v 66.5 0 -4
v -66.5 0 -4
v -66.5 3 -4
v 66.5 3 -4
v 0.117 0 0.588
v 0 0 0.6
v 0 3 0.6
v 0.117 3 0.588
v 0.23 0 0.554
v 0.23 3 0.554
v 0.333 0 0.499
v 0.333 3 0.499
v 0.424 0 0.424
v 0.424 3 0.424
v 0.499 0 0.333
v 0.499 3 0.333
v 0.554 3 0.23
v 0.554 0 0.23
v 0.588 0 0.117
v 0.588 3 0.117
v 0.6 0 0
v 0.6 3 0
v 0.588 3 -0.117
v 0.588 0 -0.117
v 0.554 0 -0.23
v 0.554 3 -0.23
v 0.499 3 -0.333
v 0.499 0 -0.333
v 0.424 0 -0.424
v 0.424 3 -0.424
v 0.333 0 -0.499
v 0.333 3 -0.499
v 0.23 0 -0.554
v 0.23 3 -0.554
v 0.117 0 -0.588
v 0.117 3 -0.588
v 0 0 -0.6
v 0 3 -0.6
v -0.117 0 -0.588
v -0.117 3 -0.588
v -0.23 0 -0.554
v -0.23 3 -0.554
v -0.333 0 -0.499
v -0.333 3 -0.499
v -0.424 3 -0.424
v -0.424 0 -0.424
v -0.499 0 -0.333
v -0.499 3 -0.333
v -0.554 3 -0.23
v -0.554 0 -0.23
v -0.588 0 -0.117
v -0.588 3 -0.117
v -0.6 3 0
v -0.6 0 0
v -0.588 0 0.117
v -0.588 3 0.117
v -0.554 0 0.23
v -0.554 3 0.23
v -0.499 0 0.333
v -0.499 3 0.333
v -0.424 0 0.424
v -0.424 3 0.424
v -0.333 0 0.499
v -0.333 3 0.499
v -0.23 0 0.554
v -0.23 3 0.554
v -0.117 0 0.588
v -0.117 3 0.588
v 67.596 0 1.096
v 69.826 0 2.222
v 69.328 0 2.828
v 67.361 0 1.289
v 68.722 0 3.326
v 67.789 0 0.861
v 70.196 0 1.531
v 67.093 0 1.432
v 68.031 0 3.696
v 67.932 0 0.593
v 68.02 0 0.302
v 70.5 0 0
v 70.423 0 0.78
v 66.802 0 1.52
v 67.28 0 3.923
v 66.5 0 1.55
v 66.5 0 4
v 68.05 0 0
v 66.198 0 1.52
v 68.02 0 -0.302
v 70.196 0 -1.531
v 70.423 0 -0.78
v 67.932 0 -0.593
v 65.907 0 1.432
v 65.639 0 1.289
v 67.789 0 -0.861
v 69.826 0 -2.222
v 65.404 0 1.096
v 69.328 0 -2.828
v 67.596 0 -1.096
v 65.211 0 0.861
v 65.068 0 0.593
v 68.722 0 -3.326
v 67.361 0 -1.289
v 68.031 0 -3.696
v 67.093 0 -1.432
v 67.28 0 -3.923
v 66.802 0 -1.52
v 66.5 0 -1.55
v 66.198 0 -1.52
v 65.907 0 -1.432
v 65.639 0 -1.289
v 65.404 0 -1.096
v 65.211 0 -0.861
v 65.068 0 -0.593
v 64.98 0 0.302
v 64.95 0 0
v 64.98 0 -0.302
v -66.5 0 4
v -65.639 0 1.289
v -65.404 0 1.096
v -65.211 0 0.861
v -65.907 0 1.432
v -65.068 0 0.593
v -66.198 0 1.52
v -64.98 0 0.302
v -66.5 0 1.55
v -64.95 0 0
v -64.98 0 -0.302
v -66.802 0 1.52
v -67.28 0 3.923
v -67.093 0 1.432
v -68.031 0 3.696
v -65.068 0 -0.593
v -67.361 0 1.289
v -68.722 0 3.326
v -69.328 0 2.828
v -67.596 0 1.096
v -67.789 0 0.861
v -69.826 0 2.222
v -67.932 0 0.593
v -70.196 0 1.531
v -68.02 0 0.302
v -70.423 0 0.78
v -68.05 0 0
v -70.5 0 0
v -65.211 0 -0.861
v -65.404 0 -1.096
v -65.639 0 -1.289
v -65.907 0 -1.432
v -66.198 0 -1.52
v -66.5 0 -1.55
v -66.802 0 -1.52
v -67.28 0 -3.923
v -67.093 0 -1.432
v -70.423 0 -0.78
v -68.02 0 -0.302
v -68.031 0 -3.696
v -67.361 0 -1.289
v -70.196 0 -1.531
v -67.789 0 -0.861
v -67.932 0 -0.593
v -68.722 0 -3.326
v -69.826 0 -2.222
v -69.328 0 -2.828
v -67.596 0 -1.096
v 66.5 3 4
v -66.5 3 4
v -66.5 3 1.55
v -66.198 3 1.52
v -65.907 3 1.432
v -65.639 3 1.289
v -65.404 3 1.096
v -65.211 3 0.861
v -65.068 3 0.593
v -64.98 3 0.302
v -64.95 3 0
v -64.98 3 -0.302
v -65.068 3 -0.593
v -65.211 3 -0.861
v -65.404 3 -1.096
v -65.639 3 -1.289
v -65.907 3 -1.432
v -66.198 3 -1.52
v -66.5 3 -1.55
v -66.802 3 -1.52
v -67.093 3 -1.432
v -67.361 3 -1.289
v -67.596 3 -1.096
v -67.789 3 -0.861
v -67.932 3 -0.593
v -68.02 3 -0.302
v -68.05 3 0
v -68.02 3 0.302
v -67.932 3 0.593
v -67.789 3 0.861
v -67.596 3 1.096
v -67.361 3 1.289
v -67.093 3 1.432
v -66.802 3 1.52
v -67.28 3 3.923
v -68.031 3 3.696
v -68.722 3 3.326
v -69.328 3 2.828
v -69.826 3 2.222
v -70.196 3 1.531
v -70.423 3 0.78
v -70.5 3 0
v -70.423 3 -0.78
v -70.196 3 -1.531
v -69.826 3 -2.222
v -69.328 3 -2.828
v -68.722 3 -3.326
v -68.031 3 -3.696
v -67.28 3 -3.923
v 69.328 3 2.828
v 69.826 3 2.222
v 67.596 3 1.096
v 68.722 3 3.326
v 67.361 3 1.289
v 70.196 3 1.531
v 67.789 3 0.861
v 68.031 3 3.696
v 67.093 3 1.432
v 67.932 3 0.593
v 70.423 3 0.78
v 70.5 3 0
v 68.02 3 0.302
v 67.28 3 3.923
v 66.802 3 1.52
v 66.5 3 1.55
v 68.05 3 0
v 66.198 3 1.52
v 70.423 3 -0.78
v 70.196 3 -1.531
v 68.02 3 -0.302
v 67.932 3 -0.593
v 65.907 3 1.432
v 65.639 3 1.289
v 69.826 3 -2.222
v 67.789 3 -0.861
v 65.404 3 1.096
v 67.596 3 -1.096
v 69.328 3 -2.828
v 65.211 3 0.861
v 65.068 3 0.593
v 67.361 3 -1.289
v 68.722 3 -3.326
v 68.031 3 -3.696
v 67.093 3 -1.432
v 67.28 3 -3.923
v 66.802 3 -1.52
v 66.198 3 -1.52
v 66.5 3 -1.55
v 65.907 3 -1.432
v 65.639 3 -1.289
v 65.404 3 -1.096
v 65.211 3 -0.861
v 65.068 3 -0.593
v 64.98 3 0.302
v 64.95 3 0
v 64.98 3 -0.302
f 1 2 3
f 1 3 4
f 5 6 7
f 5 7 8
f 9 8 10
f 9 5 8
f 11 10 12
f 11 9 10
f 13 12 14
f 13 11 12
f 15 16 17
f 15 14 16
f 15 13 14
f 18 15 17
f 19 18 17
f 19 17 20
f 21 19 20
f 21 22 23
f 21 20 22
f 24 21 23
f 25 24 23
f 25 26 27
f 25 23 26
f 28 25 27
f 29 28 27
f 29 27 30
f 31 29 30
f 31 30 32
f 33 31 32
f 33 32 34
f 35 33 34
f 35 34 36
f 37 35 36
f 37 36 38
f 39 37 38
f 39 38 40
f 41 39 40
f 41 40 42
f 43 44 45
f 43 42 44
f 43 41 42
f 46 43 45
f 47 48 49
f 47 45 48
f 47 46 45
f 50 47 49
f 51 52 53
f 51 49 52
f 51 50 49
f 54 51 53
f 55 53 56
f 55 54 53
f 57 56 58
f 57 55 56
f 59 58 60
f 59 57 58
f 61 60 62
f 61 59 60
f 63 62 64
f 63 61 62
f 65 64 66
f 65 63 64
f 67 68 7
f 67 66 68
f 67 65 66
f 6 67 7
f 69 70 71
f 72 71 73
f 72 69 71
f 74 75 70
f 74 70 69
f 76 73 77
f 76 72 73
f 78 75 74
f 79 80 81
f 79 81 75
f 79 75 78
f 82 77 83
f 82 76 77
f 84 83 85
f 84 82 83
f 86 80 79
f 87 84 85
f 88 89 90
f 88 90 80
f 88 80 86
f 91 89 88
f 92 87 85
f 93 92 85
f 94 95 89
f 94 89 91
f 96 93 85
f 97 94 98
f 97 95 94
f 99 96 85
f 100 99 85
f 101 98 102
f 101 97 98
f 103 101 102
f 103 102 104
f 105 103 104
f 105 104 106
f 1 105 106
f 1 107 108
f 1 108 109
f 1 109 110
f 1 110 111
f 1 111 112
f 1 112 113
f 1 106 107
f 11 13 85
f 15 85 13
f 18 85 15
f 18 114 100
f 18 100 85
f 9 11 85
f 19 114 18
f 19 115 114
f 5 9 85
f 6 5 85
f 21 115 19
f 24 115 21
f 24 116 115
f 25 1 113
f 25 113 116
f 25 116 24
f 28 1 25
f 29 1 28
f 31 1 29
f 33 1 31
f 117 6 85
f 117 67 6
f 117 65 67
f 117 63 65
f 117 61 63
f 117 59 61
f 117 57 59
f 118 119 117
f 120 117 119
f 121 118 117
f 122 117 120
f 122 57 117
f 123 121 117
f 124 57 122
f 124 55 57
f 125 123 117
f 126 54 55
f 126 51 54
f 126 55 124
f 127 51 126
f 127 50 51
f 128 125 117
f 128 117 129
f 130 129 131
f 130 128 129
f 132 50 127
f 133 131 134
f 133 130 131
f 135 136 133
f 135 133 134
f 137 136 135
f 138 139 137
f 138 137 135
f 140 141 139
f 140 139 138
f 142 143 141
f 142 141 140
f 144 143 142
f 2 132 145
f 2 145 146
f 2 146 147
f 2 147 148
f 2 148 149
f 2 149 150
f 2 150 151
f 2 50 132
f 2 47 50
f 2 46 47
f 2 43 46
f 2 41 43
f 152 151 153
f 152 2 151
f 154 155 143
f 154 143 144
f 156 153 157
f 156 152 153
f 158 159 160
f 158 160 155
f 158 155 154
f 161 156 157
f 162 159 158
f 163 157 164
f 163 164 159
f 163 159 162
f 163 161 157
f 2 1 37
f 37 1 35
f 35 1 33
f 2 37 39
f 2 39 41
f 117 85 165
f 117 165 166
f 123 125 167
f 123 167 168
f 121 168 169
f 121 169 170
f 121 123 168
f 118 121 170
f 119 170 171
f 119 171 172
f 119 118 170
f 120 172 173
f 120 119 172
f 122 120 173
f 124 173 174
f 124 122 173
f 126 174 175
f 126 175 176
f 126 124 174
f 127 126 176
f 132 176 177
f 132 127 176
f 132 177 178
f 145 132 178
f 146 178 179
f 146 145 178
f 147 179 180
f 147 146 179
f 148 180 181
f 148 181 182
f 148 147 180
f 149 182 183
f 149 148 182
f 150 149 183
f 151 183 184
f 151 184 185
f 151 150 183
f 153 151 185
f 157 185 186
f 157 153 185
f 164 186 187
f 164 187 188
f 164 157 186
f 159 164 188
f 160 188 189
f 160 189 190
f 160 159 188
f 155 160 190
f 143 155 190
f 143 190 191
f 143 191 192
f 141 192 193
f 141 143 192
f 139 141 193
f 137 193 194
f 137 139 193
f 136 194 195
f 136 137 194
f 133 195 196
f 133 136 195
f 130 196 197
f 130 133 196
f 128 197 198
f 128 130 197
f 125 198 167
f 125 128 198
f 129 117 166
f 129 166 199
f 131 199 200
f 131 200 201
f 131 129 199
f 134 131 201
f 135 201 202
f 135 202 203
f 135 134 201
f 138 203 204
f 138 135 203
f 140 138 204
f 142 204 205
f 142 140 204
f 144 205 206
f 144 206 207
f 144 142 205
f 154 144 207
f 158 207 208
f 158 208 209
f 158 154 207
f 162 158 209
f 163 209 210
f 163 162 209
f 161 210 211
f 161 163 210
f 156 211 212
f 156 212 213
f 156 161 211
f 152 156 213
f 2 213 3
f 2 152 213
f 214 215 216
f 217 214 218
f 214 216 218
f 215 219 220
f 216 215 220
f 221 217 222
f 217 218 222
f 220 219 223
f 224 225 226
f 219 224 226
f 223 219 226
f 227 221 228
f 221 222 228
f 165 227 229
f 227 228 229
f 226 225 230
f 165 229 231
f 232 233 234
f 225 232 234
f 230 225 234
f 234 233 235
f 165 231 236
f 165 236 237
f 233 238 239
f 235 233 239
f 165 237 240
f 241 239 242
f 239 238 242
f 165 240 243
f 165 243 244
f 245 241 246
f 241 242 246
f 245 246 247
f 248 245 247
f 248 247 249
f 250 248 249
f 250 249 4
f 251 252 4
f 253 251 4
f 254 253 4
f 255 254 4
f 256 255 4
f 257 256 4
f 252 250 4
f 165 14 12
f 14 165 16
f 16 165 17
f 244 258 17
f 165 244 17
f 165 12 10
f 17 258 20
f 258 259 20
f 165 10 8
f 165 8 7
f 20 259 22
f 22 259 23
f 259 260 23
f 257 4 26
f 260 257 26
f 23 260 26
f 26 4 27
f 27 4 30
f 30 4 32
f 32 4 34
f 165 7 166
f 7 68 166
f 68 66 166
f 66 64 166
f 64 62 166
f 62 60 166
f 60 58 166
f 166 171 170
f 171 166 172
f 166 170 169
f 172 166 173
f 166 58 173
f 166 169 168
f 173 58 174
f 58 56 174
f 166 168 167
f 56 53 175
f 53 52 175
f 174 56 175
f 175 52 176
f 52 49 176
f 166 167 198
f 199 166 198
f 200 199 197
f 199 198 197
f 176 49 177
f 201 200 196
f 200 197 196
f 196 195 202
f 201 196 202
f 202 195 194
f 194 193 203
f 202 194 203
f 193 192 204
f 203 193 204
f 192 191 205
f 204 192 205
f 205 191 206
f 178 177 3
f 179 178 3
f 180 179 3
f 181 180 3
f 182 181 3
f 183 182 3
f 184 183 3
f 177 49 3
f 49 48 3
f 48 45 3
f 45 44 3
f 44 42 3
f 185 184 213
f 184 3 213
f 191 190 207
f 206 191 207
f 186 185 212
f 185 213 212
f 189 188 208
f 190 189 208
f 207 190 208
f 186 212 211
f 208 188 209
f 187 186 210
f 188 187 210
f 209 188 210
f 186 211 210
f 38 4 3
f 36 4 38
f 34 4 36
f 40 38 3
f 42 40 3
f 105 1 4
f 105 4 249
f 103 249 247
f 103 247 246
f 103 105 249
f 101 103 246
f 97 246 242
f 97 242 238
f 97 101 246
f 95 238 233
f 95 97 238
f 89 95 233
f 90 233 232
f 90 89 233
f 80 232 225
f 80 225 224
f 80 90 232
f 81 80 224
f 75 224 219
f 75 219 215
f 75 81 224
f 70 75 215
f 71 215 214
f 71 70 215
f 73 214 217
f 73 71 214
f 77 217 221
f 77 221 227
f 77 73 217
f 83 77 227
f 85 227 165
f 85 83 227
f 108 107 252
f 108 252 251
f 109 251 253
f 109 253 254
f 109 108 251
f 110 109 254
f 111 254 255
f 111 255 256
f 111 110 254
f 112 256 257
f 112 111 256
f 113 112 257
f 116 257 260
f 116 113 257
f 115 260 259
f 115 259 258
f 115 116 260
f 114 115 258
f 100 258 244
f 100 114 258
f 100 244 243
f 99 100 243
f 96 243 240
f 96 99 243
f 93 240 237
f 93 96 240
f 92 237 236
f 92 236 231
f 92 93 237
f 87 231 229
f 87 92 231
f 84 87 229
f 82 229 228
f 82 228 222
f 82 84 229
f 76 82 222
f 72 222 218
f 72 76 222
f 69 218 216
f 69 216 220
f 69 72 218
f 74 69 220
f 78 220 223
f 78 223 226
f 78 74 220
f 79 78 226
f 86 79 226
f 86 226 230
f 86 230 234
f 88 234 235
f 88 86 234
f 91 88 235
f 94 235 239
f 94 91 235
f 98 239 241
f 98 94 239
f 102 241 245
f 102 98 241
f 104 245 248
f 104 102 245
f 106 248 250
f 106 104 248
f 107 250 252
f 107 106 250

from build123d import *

# Parameters (mm, degrees)
SKETCH1_R               = 1.55
BOSS_EXTRUDE1_DEPTH     = 3
CUT_EXTRUDE2_DEPTH      = 71.677082566
CUT_EXTRUDE2_DEPTH_BACK = 71.677082566
SKETCH2_R               = 0.6


with BuildPart() as part:
    # Sketch1 → Boss-Extrude1 (new body)
    with BuildSketch(Plane(origin=(0, 0, 0), x_dir=(1, 0, 0), z_dir=(0, 1, 0))):
        with BuildLine():
            Line((-66.5, 4), (66.5, 4))
            ThreePointArc((66.5, 4), (70.5, 0), (66.5, -4))
            Line((66.5, -4), (-66.5, -4))
            ThreePointArc((-66.5, -4), (-70.5, 0), (-66.5, 4))
        make_face()
        with Locations(Location((-66.5, 0, 0), (0, 0, 270))):
            Circle(SKETCH1_R, mode=Mode.SUBTRACT)
        with Locations(Location((66.5, 0, 0), (0, 0, 90))):
            Circle(SKETCH1_R, mode=Mode.SUBTRACT)
    extrude(amount=BOSS_EXTRUDE1_DEPTH)

    # Sketch2 → Cut-Extrude2 (cut, two sides: drawn at the far end of the back side and taken through both)
    with BuildSketch(Plane(origin=(0, 0, 0), x_dir=(1, 0, 0), z_dir=(0, 1, 0)).offset(-CUT_EXTRUDE2_DEPTH_BACK)):
        with Locations(Location((0, 0, 0), (0, 0, 270))):
            Circle(SKETCH2_R)
    extrude(amount=CUT_EXTRUDE2_DEPTH + CUT_EXTRUDE2_DEPTH_BACK, mode=Mode.SUBTRACT)


solid = part.part
